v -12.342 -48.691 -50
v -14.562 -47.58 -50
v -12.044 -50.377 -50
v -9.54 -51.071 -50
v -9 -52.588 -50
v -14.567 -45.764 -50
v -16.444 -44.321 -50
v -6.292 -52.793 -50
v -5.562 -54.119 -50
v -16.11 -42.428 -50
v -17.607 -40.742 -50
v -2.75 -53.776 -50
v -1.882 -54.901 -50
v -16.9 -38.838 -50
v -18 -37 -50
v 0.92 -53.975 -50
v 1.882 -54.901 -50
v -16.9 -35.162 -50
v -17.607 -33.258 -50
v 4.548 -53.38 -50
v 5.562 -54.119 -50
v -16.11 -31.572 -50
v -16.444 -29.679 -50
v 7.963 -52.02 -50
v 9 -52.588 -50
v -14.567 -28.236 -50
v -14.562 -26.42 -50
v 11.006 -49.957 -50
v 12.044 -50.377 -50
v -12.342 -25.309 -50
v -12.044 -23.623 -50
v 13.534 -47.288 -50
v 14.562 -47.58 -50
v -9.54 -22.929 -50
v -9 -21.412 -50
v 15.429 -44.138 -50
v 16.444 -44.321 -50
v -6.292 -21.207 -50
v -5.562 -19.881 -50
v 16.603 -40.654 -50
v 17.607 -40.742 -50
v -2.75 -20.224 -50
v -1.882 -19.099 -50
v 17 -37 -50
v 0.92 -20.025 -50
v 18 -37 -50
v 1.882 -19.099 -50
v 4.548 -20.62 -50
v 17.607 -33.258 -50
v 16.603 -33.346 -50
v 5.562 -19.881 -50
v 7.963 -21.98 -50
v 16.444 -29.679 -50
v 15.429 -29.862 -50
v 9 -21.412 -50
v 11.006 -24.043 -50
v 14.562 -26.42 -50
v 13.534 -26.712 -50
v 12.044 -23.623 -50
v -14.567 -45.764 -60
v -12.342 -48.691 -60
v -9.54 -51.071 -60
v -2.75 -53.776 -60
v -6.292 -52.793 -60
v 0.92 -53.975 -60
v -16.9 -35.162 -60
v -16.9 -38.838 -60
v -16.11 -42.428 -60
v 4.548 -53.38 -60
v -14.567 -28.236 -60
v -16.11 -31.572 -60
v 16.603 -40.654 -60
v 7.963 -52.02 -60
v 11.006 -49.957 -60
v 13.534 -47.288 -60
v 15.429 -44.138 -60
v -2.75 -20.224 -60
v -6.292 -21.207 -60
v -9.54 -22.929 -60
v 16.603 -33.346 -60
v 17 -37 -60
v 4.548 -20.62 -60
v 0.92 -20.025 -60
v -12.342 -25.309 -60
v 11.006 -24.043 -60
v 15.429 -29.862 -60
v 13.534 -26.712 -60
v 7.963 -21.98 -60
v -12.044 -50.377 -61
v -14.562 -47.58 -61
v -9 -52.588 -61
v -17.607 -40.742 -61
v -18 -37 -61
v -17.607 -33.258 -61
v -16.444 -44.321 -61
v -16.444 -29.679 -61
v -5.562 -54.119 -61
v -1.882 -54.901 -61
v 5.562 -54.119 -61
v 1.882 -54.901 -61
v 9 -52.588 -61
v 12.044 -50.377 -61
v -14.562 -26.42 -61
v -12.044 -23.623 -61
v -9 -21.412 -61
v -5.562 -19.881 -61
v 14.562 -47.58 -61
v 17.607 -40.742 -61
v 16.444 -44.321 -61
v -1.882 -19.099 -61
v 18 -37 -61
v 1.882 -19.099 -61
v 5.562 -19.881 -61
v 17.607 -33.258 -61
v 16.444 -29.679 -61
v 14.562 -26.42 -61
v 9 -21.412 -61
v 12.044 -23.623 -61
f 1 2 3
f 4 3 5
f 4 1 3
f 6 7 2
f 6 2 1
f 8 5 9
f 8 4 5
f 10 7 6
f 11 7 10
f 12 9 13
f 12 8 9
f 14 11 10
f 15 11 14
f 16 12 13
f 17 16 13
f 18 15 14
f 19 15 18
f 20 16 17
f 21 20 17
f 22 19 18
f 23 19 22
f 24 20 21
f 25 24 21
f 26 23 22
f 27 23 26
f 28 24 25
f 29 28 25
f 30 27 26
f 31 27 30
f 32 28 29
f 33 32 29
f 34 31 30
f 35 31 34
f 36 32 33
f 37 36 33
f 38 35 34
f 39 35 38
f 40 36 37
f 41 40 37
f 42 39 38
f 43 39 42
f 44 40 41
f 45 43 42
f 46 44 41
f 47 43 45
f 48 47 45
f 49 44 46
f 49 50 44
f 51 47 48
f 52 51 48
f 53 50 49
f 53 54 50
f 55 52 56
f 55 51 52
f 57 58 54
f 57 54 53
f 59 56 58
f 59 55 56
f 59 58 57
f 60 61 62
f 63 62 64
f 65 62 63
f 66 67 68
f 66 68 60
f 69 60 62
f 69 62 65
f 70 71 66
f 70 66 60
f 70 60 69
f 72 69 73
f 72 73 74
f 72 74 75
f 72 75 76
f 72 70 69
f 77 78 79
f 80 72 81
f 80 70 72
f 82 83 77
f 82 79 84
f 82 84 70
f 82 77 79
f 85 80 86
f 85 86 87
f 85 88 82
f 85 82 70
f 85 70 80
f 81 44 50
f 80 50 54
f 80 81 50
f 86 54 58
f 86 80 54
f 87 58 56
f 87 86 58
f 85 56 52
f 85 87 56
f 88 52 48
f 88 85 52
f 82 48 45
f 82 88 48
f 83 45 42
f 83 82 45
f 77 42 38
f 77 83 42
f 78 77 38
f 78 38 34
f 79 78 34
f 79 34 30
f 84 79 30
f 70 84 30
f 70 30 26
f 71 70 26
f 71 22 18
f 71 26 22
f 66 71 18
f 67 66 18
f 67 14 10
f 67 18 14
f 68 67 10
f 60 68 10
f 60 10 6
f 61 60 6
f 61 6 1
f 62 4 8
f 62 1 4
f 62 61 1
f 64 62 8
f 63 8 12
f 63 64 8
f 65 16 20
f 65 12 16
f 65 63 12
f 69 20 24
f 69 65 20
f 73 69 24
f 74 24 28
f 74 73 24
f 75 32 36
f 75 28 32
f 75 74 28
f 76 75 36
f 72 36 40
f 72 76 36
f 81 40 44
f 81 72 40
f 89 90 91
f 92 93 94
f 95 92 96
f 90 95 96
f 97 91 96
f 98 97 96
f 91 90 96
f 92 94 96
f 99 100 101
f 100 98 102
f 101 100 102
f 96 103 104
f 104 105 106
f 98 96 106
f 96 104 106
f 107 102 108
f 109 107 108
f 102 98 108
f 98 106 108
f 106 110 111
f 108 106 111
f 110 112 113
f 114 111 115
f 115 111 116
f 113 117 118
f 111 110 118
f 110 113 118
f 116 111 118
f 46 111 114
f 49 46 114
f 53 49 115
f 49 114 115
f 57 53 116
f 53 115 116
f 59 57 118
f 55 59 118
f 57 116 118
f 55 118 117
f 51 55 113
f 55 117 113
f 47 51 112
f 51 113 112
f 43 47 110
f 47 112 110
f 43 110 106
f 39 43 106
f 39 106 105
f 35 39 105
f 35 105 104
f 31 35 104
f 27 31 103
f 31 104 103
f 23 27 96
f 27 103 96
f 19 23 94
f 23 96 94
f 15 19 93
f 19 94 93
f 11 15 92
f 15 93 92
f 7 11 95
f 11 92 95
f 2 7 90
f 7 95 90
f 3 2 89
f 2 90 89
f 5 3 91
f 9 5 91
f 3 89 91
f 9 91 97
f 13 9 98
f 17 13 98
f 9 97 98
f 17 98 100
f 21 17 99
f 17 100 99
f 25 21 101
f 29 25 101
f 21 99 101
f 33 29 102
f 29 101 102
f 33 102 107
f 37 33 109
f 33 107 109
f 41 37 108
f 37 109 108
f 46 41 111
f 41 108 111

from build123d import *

# Parameters (mm, degrees)
SKETCH020_R  = 17
PAD018_DEPTH = 11
SKETCH019_R  = 18
PAD017_DEPTH = 11


with BuildPart() as body019:
    # Sketch020 → Pad018 (new body)
    with BuildSketch(Plane.XY.offset(-49)):
        with Locations((0, -37)):
            Circle(SKETCH020_R)
    extrude(amount=PAD018_DEPTH)


with BuildPart() as body019_1:
    # Body019 placement: moved
    add(body019.part.moved(Location((0, 0, 1))))


with BuildPart() as petri:
    # Sketch019 → Pad017 (new body)
    with BuildSketch(Plane.XY.offset(-49)):
        with Locations((0, -37)):
            Circle(SKETCH019_R)
    extrude(amount=PAD017_DEPTH)

    # Cut012: cut Body019
    add(body019_1.part, mode=Mode.SUBTRACT)


with BuildPart() as petri_1:
    # Cut012 placement: moved
    add(petri.part.moved(Location((0, 0, -12))))


solid = petri_1.part
